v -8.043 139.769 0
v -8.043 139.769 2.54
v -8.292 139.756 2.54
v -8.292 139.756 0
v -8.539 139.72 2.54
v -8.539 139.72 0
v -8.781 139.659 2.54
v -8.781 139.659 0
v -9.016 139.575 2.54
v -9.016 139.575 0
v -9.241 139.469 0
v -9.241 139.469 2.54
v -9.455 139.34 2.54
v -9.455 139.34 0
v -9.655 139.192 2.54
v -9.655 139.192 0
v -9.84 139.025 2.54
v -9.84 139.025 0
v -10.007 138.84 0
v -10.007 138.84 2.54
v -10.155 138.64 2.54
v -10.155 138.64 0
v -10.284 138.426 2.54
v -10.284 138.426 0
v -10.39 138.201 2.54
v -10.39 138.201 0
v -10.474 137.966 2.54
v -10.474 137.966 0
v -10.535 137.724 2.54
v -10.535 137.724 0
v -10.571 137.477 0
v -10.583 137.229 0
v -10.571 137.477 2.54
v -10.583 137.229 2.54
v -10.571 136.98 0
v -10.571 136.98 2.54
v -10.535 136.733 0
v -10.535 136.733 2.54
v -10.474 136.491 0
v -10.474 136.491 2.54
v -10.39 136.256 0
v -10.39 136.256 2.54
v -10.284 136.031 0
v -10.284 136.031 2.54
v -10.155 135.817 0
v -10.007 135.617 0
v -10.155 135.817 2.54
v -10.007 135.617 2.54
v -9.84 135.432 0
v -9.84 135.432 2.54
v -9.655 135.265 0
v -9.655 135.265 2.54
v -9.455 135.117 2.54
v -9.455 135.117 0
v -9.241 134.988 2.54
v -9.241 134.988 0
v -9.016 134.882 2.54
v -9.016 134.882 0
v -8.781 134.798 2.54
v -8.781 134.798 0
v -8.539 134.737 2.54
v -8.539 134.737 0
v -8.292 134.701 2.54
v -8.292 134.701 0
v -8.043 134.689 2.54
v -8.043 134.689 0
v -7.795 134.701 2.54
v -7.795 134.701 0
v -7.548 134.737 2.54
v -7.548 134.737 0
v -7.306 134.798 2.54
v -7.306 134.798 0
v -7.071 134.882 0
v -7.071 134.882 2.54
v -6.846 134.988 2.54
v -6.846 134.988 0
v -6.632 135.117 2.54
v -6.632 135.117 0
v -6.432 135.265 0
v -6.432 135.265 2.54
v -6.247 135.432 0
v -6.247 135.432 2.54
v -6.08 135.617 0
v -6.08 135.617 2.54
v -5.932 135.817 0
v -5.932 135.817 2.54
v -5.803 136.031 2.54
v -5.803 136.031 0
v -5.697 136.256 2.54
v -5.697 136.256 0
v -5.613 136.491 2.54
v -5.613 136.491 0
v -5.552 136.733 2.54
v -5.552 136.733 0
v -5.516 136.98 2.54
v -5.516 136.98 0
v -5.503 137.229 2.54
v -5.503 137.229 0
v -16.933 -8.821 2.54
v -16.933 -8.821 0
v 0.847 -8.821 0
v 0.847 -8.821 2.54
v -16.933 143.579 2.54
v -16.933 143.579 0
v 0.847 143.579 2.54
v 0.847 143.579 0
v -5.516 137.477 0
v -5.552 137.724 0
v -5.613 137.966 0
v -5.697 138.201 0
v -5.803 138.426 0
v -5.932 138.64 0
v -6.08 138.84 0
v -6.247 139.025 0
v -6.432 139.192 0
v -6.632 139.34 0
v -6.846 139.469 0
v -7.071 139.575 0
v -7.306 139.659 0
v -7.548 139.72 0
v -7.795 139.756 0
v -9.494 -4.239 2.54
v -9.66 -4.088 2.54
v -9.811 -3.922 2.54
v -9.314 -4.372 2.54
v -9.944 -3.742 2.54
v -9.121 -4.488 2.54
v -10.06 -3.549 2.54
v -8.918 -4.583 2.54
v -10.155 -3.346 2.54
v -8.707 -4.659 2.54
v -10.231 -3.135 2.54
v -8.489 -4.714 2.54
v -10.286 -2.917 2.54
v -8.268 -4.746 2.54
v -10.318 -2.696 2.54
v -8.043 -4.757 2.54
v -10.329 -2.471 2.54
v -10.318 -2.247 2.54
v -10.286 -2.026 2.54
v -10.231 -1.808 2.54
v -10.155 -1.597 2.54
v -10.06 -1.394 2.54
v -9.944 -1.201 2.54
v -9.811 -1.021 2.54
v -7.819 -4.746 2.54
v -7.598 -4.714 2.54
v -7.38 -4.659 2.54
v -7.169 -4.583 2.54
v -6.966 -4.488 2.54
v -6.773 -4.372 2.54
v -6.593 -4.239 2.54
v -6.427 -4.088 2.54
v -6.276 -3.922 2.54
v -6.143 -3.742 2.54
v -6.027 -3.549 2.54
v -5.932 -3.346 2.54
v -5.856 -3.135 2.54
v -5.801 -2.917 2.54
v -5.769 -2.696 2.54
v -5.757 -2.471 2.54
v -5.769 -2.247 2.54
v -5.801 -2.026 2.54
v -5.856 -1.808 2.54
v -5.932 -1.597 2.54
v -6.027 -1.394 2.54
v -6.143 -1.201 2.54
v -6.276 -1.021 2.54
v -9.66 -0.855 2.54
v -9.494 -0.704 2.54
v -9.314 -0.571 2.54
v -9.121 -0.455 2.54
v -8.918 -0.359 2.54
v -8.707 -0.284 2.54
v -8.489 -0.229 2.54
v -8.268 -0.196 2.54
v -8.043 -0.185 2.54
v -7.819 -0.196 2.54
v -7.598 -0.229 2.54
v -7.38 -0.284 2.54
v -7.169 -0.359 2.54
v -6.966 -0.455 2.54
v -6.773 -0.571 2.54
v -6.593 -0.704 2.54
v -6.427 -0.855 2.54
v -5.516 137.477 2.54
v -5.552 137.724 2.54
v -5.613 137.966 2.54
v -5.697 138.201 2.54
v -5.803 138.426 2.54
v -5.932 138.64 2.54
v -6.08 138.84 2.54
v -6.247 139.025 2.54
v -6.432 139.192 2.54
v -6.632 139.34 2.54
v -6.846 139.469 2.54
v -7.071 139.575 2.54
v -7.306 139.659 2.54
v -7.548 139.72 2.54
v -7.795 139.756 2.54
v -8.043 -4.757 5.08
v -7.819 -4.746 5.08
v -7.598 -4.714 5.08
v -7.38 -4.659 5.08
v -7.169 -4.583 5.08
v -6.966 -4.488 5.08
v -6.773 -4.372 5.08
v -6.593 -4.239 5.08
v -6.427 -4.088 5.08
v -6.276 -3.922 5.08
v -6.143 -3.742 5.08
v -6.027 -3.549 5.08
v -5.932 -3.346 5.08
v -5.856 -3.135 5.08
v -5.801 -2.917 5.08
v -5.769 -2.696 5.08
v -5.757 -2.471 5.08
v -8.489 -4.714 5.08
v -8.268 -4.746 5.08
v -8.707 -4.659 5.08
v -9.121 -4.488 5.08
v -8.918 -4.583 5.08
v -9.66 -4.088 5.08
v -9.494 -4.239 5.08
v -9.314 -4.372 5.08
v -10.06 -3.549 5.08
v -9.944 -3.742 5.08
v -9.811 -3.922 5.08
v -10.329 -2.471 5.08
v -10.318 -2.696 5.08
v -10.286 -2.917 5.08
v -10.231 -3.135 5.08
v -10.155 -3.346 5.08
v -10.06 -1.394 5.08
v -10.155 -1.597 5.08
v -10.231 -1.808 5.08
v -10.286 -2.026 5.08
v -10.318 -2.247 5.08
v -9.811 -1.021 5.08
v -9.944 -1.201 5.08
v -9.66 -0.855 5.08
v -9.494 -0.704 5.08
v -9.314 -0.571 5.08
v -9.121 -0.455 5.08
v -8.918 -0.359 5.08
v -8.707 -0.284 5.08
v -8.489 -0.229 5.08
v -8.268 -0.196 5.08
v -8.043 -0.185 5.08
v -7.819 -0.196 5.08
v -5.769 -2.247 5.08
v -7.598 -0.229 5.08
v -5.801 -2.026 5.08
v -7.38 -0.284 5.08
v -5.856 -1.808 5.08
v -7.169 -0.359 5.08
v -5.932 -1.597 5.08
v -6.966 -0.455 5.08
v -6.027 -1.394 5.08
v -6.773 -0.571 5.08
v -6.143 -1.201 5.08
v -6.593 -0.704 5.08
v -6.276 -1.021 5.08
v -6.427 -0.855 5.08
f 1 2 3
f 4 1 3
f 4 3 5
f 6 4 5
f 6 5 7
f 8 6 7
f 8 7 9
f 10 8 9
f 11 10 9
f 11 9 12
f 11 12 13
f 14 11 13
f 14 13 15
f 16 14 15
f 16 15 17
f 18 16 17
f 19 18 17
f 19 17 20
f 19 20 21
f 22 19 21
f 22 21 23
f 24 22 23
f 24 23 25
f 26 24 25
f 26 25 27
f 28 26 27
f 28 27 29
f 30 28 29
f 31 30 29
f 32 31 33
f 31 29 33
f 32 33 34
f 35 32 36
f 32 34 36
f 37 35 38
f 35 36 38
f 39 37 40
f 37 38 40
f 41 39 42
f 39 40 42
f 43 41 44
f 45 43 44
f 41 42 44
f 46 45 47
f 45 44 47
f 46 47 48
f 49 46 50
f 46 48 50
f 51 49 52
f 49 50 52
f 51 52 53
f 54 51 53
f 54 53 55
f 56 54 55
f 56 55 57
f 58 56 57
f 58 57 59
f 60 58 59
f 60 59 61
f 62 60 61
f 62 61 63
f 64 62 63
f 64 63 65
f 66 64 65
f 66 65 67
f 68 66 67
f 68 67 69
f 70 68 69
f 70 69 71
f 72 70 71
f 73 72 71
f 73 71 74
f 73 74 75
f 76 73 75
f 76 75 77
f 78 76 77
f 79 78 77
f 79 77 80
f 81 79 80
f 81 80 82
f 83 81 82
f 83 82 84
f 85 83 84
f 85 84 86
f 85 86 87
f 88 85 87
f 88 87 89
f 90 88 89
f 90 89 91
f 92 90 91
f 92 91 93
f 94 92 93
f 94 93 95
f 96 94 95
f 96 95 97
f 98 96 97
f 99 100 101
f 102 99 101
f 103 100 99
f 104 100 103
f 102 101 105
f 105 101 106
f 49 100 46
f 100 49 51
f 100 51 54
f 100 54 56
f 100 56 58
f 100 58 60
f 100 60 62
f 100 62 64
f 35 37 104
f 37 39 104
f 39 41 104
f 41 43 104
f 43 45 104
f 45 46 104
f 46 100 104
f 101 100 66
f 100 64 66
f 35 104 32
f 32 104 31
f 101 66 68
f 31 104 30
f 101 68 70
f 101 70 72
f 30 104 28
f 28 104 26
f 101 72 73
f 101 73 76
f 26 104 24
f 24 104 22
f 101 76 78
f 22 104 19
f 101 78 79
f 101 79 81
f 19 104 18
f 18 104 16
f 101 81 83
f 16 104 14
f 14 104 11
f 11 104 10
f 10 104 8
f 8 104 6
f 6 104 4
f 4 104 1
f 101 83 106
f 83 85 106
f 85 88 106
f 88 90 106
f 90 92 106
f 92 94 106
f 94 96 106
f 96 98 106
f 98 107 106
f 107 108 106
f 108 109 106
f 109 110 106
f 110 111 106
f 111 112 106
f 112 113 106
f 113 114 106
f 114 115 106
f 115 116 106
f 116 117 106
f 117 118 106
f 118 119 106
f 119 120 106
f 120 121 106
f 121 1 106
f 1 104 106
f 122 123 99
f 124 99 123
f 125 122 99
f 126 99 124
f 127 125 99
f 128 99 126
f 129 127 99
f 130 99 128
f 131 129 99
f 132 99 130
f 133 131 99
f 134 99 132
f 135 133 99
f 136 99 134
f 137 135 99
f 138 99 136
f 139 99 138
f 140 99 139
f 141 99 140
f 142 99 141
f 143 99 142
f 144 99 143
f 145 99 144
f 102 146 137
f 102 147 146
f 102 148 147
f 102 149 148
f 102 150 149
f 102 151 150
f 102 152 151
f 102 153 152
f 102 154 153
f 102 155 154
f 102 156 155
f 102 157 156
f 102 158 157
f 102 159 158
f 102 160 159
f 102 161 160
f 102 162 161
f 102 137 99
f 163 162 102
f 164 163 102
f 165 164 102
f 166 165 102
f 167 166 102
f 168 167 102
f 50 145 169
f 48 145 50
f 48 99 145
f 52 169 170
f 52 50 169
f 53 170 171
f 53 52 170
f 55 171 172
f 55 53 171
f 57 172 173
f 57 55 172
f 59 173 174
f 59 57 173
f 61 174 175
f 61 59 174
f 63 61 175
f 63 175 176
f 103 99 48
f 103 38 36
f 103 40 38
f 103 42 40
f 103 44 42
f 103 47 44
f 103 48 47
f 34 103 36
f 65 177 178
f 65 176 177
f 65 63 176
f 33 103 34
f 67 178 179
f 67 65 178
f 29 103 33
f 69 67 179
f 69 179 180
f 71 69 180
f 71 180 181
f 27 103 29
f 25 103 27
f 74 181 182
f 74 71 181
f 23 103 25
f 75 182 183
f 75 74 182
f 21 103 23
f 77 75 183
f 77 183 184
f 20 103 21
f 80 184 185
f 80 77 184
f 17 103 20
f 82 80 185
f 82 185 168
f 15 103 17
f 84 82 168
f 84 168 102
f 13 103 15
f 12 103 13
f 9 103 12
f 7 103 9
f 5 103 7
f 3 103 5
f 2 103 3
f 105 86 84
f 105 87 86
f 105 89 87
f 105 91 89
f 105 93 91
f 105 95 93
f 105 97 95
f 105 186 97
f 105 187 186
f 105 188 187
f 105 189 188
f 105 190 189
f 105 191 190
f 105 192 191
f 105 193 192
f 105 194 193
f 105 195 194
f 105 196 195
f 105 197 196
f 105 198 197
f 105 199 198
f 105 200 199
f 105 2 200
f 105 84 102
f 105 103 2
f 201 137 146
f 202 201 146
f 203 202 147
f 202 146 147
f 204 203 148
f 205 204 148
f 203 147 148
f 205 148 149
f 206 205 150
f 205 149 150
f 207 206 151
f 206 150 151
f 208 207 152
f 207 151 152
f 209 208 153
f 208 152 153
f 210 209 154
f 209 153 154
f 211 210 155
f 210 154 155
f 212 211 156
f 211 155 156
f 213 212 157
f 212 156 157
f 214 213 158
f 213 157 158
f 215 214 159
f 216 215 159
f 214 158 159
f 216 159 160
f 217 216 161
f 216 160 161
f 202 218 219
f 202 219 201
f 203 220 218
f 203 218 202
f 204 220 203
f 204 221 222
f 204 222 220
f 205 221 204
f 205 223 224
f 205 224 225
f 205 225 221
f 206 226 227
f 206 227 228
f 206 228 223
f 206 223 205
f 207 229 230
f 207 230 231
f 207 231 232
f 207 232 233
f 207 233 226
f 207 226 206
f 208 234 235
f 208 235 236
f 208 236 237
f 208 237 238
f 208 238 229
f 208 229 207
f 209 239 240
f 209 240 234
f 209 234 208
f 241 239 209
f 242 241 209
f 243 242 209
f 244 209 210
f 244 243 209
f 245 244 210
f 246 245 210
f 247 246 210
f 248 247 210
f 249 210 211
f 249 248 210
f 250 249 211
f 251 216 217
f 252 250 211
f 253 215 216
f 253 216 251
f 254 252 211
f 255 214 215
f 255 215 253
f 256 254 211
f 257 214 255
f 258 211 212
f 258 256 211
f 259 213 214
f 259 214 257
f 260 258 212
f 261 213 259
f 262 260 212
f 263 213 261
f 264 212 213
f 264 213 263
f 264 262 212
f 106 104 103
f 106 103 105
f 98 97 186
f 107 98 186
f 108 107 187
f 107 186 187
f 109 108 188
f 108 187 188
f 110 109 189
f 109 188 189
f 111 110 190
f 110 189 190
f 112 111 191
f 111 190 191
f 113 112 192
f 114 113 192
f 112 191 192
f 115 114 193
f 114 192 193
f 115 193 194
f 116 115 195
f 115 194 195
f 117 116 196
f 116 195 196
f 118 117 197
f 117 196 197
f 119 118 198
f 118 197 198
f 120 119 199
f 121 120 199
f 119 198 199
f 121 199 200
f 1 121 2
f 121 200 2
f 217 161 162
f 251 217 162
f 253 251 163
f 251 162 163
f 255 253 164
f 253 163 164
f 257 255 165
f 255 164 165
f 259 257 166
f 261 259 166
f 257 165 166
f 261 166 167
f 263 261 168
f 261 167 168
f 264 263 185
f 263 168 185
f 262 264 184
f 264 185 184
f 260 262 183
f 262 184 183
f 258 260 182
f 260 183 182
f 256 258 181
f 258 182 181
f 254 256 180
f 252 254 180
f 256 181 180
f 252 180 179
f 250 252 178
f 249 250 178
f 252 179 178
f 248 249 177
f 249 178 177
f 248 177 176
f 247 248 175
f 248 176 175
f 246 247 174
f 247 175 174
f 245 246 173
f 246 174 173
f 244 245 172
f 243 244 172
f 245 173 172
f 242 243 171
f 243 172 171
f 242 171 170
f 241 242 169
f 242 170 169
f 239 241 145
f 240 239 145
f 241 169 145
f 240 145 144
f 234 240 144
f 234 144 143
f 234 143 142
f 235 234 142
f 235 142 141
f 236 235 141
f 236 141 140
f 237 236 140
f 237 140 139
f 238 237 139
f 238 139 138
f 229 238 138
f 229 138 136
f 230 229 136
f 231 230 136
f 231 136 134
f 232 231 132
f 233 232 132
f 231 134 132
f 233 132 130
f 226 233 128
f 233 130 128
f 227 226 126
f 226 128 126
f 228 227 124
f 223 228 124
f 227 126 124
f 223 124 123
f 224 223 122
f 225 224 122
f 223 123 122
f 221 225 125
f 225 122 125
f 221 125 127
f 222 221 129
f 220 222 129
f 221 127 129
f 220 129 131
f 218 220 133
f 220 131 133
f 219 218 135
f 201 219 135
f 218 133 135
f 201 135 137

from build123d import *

# Parameters (mm, degrees)
F0_W     = 17.78
F0_H     = 152.4
F1_DEPTH = 2.54
F3_DEPTH = 2.541
F5_DEPTH = 2.54


with BuildPart() as f1:
    # F0 (on Top) → F1 (new body)
    with BuildSketch(Plane.XY):
        with Locations((-8.043494, 67.378512)):
            Rectangle(F0_W, F0_H)
    extrude(amount=F1_DEPTH)

    # F2 (on face) → F3 (cut, through all)
    with BuildSketch(Plane.XY.offset(2.54)):
        with BuildLine():
            ThreePointArc((-8.043494, 139.768512), (-9.839545, 135.432461), (-5.503494, 137.228512))
            ThreePointArc((-5.503494, 137.228512), (-6.247443, 139.024564), (-8.043494, 139.768512))
        make_face()
    extrude(amount=-F3_DEPTH, mode=Mode.SUBTRACT)

    # F4 (on face) → F5 (join)
    with BuildSketch(Plane.XY.offset(2.54)):
        with BuildLine():
            ThreePointArc((-8.043494, -4.757488), (-6.427048, -4.087934), (-5.757494, -2.471488))
            ThreePointArc((-5.757494, -2.471488), (-9.65994, -0.855042), (-8.043494, -4.757488))
        make_face()
    extrude(amount=F5_DEPTH)


solid = f1.part
